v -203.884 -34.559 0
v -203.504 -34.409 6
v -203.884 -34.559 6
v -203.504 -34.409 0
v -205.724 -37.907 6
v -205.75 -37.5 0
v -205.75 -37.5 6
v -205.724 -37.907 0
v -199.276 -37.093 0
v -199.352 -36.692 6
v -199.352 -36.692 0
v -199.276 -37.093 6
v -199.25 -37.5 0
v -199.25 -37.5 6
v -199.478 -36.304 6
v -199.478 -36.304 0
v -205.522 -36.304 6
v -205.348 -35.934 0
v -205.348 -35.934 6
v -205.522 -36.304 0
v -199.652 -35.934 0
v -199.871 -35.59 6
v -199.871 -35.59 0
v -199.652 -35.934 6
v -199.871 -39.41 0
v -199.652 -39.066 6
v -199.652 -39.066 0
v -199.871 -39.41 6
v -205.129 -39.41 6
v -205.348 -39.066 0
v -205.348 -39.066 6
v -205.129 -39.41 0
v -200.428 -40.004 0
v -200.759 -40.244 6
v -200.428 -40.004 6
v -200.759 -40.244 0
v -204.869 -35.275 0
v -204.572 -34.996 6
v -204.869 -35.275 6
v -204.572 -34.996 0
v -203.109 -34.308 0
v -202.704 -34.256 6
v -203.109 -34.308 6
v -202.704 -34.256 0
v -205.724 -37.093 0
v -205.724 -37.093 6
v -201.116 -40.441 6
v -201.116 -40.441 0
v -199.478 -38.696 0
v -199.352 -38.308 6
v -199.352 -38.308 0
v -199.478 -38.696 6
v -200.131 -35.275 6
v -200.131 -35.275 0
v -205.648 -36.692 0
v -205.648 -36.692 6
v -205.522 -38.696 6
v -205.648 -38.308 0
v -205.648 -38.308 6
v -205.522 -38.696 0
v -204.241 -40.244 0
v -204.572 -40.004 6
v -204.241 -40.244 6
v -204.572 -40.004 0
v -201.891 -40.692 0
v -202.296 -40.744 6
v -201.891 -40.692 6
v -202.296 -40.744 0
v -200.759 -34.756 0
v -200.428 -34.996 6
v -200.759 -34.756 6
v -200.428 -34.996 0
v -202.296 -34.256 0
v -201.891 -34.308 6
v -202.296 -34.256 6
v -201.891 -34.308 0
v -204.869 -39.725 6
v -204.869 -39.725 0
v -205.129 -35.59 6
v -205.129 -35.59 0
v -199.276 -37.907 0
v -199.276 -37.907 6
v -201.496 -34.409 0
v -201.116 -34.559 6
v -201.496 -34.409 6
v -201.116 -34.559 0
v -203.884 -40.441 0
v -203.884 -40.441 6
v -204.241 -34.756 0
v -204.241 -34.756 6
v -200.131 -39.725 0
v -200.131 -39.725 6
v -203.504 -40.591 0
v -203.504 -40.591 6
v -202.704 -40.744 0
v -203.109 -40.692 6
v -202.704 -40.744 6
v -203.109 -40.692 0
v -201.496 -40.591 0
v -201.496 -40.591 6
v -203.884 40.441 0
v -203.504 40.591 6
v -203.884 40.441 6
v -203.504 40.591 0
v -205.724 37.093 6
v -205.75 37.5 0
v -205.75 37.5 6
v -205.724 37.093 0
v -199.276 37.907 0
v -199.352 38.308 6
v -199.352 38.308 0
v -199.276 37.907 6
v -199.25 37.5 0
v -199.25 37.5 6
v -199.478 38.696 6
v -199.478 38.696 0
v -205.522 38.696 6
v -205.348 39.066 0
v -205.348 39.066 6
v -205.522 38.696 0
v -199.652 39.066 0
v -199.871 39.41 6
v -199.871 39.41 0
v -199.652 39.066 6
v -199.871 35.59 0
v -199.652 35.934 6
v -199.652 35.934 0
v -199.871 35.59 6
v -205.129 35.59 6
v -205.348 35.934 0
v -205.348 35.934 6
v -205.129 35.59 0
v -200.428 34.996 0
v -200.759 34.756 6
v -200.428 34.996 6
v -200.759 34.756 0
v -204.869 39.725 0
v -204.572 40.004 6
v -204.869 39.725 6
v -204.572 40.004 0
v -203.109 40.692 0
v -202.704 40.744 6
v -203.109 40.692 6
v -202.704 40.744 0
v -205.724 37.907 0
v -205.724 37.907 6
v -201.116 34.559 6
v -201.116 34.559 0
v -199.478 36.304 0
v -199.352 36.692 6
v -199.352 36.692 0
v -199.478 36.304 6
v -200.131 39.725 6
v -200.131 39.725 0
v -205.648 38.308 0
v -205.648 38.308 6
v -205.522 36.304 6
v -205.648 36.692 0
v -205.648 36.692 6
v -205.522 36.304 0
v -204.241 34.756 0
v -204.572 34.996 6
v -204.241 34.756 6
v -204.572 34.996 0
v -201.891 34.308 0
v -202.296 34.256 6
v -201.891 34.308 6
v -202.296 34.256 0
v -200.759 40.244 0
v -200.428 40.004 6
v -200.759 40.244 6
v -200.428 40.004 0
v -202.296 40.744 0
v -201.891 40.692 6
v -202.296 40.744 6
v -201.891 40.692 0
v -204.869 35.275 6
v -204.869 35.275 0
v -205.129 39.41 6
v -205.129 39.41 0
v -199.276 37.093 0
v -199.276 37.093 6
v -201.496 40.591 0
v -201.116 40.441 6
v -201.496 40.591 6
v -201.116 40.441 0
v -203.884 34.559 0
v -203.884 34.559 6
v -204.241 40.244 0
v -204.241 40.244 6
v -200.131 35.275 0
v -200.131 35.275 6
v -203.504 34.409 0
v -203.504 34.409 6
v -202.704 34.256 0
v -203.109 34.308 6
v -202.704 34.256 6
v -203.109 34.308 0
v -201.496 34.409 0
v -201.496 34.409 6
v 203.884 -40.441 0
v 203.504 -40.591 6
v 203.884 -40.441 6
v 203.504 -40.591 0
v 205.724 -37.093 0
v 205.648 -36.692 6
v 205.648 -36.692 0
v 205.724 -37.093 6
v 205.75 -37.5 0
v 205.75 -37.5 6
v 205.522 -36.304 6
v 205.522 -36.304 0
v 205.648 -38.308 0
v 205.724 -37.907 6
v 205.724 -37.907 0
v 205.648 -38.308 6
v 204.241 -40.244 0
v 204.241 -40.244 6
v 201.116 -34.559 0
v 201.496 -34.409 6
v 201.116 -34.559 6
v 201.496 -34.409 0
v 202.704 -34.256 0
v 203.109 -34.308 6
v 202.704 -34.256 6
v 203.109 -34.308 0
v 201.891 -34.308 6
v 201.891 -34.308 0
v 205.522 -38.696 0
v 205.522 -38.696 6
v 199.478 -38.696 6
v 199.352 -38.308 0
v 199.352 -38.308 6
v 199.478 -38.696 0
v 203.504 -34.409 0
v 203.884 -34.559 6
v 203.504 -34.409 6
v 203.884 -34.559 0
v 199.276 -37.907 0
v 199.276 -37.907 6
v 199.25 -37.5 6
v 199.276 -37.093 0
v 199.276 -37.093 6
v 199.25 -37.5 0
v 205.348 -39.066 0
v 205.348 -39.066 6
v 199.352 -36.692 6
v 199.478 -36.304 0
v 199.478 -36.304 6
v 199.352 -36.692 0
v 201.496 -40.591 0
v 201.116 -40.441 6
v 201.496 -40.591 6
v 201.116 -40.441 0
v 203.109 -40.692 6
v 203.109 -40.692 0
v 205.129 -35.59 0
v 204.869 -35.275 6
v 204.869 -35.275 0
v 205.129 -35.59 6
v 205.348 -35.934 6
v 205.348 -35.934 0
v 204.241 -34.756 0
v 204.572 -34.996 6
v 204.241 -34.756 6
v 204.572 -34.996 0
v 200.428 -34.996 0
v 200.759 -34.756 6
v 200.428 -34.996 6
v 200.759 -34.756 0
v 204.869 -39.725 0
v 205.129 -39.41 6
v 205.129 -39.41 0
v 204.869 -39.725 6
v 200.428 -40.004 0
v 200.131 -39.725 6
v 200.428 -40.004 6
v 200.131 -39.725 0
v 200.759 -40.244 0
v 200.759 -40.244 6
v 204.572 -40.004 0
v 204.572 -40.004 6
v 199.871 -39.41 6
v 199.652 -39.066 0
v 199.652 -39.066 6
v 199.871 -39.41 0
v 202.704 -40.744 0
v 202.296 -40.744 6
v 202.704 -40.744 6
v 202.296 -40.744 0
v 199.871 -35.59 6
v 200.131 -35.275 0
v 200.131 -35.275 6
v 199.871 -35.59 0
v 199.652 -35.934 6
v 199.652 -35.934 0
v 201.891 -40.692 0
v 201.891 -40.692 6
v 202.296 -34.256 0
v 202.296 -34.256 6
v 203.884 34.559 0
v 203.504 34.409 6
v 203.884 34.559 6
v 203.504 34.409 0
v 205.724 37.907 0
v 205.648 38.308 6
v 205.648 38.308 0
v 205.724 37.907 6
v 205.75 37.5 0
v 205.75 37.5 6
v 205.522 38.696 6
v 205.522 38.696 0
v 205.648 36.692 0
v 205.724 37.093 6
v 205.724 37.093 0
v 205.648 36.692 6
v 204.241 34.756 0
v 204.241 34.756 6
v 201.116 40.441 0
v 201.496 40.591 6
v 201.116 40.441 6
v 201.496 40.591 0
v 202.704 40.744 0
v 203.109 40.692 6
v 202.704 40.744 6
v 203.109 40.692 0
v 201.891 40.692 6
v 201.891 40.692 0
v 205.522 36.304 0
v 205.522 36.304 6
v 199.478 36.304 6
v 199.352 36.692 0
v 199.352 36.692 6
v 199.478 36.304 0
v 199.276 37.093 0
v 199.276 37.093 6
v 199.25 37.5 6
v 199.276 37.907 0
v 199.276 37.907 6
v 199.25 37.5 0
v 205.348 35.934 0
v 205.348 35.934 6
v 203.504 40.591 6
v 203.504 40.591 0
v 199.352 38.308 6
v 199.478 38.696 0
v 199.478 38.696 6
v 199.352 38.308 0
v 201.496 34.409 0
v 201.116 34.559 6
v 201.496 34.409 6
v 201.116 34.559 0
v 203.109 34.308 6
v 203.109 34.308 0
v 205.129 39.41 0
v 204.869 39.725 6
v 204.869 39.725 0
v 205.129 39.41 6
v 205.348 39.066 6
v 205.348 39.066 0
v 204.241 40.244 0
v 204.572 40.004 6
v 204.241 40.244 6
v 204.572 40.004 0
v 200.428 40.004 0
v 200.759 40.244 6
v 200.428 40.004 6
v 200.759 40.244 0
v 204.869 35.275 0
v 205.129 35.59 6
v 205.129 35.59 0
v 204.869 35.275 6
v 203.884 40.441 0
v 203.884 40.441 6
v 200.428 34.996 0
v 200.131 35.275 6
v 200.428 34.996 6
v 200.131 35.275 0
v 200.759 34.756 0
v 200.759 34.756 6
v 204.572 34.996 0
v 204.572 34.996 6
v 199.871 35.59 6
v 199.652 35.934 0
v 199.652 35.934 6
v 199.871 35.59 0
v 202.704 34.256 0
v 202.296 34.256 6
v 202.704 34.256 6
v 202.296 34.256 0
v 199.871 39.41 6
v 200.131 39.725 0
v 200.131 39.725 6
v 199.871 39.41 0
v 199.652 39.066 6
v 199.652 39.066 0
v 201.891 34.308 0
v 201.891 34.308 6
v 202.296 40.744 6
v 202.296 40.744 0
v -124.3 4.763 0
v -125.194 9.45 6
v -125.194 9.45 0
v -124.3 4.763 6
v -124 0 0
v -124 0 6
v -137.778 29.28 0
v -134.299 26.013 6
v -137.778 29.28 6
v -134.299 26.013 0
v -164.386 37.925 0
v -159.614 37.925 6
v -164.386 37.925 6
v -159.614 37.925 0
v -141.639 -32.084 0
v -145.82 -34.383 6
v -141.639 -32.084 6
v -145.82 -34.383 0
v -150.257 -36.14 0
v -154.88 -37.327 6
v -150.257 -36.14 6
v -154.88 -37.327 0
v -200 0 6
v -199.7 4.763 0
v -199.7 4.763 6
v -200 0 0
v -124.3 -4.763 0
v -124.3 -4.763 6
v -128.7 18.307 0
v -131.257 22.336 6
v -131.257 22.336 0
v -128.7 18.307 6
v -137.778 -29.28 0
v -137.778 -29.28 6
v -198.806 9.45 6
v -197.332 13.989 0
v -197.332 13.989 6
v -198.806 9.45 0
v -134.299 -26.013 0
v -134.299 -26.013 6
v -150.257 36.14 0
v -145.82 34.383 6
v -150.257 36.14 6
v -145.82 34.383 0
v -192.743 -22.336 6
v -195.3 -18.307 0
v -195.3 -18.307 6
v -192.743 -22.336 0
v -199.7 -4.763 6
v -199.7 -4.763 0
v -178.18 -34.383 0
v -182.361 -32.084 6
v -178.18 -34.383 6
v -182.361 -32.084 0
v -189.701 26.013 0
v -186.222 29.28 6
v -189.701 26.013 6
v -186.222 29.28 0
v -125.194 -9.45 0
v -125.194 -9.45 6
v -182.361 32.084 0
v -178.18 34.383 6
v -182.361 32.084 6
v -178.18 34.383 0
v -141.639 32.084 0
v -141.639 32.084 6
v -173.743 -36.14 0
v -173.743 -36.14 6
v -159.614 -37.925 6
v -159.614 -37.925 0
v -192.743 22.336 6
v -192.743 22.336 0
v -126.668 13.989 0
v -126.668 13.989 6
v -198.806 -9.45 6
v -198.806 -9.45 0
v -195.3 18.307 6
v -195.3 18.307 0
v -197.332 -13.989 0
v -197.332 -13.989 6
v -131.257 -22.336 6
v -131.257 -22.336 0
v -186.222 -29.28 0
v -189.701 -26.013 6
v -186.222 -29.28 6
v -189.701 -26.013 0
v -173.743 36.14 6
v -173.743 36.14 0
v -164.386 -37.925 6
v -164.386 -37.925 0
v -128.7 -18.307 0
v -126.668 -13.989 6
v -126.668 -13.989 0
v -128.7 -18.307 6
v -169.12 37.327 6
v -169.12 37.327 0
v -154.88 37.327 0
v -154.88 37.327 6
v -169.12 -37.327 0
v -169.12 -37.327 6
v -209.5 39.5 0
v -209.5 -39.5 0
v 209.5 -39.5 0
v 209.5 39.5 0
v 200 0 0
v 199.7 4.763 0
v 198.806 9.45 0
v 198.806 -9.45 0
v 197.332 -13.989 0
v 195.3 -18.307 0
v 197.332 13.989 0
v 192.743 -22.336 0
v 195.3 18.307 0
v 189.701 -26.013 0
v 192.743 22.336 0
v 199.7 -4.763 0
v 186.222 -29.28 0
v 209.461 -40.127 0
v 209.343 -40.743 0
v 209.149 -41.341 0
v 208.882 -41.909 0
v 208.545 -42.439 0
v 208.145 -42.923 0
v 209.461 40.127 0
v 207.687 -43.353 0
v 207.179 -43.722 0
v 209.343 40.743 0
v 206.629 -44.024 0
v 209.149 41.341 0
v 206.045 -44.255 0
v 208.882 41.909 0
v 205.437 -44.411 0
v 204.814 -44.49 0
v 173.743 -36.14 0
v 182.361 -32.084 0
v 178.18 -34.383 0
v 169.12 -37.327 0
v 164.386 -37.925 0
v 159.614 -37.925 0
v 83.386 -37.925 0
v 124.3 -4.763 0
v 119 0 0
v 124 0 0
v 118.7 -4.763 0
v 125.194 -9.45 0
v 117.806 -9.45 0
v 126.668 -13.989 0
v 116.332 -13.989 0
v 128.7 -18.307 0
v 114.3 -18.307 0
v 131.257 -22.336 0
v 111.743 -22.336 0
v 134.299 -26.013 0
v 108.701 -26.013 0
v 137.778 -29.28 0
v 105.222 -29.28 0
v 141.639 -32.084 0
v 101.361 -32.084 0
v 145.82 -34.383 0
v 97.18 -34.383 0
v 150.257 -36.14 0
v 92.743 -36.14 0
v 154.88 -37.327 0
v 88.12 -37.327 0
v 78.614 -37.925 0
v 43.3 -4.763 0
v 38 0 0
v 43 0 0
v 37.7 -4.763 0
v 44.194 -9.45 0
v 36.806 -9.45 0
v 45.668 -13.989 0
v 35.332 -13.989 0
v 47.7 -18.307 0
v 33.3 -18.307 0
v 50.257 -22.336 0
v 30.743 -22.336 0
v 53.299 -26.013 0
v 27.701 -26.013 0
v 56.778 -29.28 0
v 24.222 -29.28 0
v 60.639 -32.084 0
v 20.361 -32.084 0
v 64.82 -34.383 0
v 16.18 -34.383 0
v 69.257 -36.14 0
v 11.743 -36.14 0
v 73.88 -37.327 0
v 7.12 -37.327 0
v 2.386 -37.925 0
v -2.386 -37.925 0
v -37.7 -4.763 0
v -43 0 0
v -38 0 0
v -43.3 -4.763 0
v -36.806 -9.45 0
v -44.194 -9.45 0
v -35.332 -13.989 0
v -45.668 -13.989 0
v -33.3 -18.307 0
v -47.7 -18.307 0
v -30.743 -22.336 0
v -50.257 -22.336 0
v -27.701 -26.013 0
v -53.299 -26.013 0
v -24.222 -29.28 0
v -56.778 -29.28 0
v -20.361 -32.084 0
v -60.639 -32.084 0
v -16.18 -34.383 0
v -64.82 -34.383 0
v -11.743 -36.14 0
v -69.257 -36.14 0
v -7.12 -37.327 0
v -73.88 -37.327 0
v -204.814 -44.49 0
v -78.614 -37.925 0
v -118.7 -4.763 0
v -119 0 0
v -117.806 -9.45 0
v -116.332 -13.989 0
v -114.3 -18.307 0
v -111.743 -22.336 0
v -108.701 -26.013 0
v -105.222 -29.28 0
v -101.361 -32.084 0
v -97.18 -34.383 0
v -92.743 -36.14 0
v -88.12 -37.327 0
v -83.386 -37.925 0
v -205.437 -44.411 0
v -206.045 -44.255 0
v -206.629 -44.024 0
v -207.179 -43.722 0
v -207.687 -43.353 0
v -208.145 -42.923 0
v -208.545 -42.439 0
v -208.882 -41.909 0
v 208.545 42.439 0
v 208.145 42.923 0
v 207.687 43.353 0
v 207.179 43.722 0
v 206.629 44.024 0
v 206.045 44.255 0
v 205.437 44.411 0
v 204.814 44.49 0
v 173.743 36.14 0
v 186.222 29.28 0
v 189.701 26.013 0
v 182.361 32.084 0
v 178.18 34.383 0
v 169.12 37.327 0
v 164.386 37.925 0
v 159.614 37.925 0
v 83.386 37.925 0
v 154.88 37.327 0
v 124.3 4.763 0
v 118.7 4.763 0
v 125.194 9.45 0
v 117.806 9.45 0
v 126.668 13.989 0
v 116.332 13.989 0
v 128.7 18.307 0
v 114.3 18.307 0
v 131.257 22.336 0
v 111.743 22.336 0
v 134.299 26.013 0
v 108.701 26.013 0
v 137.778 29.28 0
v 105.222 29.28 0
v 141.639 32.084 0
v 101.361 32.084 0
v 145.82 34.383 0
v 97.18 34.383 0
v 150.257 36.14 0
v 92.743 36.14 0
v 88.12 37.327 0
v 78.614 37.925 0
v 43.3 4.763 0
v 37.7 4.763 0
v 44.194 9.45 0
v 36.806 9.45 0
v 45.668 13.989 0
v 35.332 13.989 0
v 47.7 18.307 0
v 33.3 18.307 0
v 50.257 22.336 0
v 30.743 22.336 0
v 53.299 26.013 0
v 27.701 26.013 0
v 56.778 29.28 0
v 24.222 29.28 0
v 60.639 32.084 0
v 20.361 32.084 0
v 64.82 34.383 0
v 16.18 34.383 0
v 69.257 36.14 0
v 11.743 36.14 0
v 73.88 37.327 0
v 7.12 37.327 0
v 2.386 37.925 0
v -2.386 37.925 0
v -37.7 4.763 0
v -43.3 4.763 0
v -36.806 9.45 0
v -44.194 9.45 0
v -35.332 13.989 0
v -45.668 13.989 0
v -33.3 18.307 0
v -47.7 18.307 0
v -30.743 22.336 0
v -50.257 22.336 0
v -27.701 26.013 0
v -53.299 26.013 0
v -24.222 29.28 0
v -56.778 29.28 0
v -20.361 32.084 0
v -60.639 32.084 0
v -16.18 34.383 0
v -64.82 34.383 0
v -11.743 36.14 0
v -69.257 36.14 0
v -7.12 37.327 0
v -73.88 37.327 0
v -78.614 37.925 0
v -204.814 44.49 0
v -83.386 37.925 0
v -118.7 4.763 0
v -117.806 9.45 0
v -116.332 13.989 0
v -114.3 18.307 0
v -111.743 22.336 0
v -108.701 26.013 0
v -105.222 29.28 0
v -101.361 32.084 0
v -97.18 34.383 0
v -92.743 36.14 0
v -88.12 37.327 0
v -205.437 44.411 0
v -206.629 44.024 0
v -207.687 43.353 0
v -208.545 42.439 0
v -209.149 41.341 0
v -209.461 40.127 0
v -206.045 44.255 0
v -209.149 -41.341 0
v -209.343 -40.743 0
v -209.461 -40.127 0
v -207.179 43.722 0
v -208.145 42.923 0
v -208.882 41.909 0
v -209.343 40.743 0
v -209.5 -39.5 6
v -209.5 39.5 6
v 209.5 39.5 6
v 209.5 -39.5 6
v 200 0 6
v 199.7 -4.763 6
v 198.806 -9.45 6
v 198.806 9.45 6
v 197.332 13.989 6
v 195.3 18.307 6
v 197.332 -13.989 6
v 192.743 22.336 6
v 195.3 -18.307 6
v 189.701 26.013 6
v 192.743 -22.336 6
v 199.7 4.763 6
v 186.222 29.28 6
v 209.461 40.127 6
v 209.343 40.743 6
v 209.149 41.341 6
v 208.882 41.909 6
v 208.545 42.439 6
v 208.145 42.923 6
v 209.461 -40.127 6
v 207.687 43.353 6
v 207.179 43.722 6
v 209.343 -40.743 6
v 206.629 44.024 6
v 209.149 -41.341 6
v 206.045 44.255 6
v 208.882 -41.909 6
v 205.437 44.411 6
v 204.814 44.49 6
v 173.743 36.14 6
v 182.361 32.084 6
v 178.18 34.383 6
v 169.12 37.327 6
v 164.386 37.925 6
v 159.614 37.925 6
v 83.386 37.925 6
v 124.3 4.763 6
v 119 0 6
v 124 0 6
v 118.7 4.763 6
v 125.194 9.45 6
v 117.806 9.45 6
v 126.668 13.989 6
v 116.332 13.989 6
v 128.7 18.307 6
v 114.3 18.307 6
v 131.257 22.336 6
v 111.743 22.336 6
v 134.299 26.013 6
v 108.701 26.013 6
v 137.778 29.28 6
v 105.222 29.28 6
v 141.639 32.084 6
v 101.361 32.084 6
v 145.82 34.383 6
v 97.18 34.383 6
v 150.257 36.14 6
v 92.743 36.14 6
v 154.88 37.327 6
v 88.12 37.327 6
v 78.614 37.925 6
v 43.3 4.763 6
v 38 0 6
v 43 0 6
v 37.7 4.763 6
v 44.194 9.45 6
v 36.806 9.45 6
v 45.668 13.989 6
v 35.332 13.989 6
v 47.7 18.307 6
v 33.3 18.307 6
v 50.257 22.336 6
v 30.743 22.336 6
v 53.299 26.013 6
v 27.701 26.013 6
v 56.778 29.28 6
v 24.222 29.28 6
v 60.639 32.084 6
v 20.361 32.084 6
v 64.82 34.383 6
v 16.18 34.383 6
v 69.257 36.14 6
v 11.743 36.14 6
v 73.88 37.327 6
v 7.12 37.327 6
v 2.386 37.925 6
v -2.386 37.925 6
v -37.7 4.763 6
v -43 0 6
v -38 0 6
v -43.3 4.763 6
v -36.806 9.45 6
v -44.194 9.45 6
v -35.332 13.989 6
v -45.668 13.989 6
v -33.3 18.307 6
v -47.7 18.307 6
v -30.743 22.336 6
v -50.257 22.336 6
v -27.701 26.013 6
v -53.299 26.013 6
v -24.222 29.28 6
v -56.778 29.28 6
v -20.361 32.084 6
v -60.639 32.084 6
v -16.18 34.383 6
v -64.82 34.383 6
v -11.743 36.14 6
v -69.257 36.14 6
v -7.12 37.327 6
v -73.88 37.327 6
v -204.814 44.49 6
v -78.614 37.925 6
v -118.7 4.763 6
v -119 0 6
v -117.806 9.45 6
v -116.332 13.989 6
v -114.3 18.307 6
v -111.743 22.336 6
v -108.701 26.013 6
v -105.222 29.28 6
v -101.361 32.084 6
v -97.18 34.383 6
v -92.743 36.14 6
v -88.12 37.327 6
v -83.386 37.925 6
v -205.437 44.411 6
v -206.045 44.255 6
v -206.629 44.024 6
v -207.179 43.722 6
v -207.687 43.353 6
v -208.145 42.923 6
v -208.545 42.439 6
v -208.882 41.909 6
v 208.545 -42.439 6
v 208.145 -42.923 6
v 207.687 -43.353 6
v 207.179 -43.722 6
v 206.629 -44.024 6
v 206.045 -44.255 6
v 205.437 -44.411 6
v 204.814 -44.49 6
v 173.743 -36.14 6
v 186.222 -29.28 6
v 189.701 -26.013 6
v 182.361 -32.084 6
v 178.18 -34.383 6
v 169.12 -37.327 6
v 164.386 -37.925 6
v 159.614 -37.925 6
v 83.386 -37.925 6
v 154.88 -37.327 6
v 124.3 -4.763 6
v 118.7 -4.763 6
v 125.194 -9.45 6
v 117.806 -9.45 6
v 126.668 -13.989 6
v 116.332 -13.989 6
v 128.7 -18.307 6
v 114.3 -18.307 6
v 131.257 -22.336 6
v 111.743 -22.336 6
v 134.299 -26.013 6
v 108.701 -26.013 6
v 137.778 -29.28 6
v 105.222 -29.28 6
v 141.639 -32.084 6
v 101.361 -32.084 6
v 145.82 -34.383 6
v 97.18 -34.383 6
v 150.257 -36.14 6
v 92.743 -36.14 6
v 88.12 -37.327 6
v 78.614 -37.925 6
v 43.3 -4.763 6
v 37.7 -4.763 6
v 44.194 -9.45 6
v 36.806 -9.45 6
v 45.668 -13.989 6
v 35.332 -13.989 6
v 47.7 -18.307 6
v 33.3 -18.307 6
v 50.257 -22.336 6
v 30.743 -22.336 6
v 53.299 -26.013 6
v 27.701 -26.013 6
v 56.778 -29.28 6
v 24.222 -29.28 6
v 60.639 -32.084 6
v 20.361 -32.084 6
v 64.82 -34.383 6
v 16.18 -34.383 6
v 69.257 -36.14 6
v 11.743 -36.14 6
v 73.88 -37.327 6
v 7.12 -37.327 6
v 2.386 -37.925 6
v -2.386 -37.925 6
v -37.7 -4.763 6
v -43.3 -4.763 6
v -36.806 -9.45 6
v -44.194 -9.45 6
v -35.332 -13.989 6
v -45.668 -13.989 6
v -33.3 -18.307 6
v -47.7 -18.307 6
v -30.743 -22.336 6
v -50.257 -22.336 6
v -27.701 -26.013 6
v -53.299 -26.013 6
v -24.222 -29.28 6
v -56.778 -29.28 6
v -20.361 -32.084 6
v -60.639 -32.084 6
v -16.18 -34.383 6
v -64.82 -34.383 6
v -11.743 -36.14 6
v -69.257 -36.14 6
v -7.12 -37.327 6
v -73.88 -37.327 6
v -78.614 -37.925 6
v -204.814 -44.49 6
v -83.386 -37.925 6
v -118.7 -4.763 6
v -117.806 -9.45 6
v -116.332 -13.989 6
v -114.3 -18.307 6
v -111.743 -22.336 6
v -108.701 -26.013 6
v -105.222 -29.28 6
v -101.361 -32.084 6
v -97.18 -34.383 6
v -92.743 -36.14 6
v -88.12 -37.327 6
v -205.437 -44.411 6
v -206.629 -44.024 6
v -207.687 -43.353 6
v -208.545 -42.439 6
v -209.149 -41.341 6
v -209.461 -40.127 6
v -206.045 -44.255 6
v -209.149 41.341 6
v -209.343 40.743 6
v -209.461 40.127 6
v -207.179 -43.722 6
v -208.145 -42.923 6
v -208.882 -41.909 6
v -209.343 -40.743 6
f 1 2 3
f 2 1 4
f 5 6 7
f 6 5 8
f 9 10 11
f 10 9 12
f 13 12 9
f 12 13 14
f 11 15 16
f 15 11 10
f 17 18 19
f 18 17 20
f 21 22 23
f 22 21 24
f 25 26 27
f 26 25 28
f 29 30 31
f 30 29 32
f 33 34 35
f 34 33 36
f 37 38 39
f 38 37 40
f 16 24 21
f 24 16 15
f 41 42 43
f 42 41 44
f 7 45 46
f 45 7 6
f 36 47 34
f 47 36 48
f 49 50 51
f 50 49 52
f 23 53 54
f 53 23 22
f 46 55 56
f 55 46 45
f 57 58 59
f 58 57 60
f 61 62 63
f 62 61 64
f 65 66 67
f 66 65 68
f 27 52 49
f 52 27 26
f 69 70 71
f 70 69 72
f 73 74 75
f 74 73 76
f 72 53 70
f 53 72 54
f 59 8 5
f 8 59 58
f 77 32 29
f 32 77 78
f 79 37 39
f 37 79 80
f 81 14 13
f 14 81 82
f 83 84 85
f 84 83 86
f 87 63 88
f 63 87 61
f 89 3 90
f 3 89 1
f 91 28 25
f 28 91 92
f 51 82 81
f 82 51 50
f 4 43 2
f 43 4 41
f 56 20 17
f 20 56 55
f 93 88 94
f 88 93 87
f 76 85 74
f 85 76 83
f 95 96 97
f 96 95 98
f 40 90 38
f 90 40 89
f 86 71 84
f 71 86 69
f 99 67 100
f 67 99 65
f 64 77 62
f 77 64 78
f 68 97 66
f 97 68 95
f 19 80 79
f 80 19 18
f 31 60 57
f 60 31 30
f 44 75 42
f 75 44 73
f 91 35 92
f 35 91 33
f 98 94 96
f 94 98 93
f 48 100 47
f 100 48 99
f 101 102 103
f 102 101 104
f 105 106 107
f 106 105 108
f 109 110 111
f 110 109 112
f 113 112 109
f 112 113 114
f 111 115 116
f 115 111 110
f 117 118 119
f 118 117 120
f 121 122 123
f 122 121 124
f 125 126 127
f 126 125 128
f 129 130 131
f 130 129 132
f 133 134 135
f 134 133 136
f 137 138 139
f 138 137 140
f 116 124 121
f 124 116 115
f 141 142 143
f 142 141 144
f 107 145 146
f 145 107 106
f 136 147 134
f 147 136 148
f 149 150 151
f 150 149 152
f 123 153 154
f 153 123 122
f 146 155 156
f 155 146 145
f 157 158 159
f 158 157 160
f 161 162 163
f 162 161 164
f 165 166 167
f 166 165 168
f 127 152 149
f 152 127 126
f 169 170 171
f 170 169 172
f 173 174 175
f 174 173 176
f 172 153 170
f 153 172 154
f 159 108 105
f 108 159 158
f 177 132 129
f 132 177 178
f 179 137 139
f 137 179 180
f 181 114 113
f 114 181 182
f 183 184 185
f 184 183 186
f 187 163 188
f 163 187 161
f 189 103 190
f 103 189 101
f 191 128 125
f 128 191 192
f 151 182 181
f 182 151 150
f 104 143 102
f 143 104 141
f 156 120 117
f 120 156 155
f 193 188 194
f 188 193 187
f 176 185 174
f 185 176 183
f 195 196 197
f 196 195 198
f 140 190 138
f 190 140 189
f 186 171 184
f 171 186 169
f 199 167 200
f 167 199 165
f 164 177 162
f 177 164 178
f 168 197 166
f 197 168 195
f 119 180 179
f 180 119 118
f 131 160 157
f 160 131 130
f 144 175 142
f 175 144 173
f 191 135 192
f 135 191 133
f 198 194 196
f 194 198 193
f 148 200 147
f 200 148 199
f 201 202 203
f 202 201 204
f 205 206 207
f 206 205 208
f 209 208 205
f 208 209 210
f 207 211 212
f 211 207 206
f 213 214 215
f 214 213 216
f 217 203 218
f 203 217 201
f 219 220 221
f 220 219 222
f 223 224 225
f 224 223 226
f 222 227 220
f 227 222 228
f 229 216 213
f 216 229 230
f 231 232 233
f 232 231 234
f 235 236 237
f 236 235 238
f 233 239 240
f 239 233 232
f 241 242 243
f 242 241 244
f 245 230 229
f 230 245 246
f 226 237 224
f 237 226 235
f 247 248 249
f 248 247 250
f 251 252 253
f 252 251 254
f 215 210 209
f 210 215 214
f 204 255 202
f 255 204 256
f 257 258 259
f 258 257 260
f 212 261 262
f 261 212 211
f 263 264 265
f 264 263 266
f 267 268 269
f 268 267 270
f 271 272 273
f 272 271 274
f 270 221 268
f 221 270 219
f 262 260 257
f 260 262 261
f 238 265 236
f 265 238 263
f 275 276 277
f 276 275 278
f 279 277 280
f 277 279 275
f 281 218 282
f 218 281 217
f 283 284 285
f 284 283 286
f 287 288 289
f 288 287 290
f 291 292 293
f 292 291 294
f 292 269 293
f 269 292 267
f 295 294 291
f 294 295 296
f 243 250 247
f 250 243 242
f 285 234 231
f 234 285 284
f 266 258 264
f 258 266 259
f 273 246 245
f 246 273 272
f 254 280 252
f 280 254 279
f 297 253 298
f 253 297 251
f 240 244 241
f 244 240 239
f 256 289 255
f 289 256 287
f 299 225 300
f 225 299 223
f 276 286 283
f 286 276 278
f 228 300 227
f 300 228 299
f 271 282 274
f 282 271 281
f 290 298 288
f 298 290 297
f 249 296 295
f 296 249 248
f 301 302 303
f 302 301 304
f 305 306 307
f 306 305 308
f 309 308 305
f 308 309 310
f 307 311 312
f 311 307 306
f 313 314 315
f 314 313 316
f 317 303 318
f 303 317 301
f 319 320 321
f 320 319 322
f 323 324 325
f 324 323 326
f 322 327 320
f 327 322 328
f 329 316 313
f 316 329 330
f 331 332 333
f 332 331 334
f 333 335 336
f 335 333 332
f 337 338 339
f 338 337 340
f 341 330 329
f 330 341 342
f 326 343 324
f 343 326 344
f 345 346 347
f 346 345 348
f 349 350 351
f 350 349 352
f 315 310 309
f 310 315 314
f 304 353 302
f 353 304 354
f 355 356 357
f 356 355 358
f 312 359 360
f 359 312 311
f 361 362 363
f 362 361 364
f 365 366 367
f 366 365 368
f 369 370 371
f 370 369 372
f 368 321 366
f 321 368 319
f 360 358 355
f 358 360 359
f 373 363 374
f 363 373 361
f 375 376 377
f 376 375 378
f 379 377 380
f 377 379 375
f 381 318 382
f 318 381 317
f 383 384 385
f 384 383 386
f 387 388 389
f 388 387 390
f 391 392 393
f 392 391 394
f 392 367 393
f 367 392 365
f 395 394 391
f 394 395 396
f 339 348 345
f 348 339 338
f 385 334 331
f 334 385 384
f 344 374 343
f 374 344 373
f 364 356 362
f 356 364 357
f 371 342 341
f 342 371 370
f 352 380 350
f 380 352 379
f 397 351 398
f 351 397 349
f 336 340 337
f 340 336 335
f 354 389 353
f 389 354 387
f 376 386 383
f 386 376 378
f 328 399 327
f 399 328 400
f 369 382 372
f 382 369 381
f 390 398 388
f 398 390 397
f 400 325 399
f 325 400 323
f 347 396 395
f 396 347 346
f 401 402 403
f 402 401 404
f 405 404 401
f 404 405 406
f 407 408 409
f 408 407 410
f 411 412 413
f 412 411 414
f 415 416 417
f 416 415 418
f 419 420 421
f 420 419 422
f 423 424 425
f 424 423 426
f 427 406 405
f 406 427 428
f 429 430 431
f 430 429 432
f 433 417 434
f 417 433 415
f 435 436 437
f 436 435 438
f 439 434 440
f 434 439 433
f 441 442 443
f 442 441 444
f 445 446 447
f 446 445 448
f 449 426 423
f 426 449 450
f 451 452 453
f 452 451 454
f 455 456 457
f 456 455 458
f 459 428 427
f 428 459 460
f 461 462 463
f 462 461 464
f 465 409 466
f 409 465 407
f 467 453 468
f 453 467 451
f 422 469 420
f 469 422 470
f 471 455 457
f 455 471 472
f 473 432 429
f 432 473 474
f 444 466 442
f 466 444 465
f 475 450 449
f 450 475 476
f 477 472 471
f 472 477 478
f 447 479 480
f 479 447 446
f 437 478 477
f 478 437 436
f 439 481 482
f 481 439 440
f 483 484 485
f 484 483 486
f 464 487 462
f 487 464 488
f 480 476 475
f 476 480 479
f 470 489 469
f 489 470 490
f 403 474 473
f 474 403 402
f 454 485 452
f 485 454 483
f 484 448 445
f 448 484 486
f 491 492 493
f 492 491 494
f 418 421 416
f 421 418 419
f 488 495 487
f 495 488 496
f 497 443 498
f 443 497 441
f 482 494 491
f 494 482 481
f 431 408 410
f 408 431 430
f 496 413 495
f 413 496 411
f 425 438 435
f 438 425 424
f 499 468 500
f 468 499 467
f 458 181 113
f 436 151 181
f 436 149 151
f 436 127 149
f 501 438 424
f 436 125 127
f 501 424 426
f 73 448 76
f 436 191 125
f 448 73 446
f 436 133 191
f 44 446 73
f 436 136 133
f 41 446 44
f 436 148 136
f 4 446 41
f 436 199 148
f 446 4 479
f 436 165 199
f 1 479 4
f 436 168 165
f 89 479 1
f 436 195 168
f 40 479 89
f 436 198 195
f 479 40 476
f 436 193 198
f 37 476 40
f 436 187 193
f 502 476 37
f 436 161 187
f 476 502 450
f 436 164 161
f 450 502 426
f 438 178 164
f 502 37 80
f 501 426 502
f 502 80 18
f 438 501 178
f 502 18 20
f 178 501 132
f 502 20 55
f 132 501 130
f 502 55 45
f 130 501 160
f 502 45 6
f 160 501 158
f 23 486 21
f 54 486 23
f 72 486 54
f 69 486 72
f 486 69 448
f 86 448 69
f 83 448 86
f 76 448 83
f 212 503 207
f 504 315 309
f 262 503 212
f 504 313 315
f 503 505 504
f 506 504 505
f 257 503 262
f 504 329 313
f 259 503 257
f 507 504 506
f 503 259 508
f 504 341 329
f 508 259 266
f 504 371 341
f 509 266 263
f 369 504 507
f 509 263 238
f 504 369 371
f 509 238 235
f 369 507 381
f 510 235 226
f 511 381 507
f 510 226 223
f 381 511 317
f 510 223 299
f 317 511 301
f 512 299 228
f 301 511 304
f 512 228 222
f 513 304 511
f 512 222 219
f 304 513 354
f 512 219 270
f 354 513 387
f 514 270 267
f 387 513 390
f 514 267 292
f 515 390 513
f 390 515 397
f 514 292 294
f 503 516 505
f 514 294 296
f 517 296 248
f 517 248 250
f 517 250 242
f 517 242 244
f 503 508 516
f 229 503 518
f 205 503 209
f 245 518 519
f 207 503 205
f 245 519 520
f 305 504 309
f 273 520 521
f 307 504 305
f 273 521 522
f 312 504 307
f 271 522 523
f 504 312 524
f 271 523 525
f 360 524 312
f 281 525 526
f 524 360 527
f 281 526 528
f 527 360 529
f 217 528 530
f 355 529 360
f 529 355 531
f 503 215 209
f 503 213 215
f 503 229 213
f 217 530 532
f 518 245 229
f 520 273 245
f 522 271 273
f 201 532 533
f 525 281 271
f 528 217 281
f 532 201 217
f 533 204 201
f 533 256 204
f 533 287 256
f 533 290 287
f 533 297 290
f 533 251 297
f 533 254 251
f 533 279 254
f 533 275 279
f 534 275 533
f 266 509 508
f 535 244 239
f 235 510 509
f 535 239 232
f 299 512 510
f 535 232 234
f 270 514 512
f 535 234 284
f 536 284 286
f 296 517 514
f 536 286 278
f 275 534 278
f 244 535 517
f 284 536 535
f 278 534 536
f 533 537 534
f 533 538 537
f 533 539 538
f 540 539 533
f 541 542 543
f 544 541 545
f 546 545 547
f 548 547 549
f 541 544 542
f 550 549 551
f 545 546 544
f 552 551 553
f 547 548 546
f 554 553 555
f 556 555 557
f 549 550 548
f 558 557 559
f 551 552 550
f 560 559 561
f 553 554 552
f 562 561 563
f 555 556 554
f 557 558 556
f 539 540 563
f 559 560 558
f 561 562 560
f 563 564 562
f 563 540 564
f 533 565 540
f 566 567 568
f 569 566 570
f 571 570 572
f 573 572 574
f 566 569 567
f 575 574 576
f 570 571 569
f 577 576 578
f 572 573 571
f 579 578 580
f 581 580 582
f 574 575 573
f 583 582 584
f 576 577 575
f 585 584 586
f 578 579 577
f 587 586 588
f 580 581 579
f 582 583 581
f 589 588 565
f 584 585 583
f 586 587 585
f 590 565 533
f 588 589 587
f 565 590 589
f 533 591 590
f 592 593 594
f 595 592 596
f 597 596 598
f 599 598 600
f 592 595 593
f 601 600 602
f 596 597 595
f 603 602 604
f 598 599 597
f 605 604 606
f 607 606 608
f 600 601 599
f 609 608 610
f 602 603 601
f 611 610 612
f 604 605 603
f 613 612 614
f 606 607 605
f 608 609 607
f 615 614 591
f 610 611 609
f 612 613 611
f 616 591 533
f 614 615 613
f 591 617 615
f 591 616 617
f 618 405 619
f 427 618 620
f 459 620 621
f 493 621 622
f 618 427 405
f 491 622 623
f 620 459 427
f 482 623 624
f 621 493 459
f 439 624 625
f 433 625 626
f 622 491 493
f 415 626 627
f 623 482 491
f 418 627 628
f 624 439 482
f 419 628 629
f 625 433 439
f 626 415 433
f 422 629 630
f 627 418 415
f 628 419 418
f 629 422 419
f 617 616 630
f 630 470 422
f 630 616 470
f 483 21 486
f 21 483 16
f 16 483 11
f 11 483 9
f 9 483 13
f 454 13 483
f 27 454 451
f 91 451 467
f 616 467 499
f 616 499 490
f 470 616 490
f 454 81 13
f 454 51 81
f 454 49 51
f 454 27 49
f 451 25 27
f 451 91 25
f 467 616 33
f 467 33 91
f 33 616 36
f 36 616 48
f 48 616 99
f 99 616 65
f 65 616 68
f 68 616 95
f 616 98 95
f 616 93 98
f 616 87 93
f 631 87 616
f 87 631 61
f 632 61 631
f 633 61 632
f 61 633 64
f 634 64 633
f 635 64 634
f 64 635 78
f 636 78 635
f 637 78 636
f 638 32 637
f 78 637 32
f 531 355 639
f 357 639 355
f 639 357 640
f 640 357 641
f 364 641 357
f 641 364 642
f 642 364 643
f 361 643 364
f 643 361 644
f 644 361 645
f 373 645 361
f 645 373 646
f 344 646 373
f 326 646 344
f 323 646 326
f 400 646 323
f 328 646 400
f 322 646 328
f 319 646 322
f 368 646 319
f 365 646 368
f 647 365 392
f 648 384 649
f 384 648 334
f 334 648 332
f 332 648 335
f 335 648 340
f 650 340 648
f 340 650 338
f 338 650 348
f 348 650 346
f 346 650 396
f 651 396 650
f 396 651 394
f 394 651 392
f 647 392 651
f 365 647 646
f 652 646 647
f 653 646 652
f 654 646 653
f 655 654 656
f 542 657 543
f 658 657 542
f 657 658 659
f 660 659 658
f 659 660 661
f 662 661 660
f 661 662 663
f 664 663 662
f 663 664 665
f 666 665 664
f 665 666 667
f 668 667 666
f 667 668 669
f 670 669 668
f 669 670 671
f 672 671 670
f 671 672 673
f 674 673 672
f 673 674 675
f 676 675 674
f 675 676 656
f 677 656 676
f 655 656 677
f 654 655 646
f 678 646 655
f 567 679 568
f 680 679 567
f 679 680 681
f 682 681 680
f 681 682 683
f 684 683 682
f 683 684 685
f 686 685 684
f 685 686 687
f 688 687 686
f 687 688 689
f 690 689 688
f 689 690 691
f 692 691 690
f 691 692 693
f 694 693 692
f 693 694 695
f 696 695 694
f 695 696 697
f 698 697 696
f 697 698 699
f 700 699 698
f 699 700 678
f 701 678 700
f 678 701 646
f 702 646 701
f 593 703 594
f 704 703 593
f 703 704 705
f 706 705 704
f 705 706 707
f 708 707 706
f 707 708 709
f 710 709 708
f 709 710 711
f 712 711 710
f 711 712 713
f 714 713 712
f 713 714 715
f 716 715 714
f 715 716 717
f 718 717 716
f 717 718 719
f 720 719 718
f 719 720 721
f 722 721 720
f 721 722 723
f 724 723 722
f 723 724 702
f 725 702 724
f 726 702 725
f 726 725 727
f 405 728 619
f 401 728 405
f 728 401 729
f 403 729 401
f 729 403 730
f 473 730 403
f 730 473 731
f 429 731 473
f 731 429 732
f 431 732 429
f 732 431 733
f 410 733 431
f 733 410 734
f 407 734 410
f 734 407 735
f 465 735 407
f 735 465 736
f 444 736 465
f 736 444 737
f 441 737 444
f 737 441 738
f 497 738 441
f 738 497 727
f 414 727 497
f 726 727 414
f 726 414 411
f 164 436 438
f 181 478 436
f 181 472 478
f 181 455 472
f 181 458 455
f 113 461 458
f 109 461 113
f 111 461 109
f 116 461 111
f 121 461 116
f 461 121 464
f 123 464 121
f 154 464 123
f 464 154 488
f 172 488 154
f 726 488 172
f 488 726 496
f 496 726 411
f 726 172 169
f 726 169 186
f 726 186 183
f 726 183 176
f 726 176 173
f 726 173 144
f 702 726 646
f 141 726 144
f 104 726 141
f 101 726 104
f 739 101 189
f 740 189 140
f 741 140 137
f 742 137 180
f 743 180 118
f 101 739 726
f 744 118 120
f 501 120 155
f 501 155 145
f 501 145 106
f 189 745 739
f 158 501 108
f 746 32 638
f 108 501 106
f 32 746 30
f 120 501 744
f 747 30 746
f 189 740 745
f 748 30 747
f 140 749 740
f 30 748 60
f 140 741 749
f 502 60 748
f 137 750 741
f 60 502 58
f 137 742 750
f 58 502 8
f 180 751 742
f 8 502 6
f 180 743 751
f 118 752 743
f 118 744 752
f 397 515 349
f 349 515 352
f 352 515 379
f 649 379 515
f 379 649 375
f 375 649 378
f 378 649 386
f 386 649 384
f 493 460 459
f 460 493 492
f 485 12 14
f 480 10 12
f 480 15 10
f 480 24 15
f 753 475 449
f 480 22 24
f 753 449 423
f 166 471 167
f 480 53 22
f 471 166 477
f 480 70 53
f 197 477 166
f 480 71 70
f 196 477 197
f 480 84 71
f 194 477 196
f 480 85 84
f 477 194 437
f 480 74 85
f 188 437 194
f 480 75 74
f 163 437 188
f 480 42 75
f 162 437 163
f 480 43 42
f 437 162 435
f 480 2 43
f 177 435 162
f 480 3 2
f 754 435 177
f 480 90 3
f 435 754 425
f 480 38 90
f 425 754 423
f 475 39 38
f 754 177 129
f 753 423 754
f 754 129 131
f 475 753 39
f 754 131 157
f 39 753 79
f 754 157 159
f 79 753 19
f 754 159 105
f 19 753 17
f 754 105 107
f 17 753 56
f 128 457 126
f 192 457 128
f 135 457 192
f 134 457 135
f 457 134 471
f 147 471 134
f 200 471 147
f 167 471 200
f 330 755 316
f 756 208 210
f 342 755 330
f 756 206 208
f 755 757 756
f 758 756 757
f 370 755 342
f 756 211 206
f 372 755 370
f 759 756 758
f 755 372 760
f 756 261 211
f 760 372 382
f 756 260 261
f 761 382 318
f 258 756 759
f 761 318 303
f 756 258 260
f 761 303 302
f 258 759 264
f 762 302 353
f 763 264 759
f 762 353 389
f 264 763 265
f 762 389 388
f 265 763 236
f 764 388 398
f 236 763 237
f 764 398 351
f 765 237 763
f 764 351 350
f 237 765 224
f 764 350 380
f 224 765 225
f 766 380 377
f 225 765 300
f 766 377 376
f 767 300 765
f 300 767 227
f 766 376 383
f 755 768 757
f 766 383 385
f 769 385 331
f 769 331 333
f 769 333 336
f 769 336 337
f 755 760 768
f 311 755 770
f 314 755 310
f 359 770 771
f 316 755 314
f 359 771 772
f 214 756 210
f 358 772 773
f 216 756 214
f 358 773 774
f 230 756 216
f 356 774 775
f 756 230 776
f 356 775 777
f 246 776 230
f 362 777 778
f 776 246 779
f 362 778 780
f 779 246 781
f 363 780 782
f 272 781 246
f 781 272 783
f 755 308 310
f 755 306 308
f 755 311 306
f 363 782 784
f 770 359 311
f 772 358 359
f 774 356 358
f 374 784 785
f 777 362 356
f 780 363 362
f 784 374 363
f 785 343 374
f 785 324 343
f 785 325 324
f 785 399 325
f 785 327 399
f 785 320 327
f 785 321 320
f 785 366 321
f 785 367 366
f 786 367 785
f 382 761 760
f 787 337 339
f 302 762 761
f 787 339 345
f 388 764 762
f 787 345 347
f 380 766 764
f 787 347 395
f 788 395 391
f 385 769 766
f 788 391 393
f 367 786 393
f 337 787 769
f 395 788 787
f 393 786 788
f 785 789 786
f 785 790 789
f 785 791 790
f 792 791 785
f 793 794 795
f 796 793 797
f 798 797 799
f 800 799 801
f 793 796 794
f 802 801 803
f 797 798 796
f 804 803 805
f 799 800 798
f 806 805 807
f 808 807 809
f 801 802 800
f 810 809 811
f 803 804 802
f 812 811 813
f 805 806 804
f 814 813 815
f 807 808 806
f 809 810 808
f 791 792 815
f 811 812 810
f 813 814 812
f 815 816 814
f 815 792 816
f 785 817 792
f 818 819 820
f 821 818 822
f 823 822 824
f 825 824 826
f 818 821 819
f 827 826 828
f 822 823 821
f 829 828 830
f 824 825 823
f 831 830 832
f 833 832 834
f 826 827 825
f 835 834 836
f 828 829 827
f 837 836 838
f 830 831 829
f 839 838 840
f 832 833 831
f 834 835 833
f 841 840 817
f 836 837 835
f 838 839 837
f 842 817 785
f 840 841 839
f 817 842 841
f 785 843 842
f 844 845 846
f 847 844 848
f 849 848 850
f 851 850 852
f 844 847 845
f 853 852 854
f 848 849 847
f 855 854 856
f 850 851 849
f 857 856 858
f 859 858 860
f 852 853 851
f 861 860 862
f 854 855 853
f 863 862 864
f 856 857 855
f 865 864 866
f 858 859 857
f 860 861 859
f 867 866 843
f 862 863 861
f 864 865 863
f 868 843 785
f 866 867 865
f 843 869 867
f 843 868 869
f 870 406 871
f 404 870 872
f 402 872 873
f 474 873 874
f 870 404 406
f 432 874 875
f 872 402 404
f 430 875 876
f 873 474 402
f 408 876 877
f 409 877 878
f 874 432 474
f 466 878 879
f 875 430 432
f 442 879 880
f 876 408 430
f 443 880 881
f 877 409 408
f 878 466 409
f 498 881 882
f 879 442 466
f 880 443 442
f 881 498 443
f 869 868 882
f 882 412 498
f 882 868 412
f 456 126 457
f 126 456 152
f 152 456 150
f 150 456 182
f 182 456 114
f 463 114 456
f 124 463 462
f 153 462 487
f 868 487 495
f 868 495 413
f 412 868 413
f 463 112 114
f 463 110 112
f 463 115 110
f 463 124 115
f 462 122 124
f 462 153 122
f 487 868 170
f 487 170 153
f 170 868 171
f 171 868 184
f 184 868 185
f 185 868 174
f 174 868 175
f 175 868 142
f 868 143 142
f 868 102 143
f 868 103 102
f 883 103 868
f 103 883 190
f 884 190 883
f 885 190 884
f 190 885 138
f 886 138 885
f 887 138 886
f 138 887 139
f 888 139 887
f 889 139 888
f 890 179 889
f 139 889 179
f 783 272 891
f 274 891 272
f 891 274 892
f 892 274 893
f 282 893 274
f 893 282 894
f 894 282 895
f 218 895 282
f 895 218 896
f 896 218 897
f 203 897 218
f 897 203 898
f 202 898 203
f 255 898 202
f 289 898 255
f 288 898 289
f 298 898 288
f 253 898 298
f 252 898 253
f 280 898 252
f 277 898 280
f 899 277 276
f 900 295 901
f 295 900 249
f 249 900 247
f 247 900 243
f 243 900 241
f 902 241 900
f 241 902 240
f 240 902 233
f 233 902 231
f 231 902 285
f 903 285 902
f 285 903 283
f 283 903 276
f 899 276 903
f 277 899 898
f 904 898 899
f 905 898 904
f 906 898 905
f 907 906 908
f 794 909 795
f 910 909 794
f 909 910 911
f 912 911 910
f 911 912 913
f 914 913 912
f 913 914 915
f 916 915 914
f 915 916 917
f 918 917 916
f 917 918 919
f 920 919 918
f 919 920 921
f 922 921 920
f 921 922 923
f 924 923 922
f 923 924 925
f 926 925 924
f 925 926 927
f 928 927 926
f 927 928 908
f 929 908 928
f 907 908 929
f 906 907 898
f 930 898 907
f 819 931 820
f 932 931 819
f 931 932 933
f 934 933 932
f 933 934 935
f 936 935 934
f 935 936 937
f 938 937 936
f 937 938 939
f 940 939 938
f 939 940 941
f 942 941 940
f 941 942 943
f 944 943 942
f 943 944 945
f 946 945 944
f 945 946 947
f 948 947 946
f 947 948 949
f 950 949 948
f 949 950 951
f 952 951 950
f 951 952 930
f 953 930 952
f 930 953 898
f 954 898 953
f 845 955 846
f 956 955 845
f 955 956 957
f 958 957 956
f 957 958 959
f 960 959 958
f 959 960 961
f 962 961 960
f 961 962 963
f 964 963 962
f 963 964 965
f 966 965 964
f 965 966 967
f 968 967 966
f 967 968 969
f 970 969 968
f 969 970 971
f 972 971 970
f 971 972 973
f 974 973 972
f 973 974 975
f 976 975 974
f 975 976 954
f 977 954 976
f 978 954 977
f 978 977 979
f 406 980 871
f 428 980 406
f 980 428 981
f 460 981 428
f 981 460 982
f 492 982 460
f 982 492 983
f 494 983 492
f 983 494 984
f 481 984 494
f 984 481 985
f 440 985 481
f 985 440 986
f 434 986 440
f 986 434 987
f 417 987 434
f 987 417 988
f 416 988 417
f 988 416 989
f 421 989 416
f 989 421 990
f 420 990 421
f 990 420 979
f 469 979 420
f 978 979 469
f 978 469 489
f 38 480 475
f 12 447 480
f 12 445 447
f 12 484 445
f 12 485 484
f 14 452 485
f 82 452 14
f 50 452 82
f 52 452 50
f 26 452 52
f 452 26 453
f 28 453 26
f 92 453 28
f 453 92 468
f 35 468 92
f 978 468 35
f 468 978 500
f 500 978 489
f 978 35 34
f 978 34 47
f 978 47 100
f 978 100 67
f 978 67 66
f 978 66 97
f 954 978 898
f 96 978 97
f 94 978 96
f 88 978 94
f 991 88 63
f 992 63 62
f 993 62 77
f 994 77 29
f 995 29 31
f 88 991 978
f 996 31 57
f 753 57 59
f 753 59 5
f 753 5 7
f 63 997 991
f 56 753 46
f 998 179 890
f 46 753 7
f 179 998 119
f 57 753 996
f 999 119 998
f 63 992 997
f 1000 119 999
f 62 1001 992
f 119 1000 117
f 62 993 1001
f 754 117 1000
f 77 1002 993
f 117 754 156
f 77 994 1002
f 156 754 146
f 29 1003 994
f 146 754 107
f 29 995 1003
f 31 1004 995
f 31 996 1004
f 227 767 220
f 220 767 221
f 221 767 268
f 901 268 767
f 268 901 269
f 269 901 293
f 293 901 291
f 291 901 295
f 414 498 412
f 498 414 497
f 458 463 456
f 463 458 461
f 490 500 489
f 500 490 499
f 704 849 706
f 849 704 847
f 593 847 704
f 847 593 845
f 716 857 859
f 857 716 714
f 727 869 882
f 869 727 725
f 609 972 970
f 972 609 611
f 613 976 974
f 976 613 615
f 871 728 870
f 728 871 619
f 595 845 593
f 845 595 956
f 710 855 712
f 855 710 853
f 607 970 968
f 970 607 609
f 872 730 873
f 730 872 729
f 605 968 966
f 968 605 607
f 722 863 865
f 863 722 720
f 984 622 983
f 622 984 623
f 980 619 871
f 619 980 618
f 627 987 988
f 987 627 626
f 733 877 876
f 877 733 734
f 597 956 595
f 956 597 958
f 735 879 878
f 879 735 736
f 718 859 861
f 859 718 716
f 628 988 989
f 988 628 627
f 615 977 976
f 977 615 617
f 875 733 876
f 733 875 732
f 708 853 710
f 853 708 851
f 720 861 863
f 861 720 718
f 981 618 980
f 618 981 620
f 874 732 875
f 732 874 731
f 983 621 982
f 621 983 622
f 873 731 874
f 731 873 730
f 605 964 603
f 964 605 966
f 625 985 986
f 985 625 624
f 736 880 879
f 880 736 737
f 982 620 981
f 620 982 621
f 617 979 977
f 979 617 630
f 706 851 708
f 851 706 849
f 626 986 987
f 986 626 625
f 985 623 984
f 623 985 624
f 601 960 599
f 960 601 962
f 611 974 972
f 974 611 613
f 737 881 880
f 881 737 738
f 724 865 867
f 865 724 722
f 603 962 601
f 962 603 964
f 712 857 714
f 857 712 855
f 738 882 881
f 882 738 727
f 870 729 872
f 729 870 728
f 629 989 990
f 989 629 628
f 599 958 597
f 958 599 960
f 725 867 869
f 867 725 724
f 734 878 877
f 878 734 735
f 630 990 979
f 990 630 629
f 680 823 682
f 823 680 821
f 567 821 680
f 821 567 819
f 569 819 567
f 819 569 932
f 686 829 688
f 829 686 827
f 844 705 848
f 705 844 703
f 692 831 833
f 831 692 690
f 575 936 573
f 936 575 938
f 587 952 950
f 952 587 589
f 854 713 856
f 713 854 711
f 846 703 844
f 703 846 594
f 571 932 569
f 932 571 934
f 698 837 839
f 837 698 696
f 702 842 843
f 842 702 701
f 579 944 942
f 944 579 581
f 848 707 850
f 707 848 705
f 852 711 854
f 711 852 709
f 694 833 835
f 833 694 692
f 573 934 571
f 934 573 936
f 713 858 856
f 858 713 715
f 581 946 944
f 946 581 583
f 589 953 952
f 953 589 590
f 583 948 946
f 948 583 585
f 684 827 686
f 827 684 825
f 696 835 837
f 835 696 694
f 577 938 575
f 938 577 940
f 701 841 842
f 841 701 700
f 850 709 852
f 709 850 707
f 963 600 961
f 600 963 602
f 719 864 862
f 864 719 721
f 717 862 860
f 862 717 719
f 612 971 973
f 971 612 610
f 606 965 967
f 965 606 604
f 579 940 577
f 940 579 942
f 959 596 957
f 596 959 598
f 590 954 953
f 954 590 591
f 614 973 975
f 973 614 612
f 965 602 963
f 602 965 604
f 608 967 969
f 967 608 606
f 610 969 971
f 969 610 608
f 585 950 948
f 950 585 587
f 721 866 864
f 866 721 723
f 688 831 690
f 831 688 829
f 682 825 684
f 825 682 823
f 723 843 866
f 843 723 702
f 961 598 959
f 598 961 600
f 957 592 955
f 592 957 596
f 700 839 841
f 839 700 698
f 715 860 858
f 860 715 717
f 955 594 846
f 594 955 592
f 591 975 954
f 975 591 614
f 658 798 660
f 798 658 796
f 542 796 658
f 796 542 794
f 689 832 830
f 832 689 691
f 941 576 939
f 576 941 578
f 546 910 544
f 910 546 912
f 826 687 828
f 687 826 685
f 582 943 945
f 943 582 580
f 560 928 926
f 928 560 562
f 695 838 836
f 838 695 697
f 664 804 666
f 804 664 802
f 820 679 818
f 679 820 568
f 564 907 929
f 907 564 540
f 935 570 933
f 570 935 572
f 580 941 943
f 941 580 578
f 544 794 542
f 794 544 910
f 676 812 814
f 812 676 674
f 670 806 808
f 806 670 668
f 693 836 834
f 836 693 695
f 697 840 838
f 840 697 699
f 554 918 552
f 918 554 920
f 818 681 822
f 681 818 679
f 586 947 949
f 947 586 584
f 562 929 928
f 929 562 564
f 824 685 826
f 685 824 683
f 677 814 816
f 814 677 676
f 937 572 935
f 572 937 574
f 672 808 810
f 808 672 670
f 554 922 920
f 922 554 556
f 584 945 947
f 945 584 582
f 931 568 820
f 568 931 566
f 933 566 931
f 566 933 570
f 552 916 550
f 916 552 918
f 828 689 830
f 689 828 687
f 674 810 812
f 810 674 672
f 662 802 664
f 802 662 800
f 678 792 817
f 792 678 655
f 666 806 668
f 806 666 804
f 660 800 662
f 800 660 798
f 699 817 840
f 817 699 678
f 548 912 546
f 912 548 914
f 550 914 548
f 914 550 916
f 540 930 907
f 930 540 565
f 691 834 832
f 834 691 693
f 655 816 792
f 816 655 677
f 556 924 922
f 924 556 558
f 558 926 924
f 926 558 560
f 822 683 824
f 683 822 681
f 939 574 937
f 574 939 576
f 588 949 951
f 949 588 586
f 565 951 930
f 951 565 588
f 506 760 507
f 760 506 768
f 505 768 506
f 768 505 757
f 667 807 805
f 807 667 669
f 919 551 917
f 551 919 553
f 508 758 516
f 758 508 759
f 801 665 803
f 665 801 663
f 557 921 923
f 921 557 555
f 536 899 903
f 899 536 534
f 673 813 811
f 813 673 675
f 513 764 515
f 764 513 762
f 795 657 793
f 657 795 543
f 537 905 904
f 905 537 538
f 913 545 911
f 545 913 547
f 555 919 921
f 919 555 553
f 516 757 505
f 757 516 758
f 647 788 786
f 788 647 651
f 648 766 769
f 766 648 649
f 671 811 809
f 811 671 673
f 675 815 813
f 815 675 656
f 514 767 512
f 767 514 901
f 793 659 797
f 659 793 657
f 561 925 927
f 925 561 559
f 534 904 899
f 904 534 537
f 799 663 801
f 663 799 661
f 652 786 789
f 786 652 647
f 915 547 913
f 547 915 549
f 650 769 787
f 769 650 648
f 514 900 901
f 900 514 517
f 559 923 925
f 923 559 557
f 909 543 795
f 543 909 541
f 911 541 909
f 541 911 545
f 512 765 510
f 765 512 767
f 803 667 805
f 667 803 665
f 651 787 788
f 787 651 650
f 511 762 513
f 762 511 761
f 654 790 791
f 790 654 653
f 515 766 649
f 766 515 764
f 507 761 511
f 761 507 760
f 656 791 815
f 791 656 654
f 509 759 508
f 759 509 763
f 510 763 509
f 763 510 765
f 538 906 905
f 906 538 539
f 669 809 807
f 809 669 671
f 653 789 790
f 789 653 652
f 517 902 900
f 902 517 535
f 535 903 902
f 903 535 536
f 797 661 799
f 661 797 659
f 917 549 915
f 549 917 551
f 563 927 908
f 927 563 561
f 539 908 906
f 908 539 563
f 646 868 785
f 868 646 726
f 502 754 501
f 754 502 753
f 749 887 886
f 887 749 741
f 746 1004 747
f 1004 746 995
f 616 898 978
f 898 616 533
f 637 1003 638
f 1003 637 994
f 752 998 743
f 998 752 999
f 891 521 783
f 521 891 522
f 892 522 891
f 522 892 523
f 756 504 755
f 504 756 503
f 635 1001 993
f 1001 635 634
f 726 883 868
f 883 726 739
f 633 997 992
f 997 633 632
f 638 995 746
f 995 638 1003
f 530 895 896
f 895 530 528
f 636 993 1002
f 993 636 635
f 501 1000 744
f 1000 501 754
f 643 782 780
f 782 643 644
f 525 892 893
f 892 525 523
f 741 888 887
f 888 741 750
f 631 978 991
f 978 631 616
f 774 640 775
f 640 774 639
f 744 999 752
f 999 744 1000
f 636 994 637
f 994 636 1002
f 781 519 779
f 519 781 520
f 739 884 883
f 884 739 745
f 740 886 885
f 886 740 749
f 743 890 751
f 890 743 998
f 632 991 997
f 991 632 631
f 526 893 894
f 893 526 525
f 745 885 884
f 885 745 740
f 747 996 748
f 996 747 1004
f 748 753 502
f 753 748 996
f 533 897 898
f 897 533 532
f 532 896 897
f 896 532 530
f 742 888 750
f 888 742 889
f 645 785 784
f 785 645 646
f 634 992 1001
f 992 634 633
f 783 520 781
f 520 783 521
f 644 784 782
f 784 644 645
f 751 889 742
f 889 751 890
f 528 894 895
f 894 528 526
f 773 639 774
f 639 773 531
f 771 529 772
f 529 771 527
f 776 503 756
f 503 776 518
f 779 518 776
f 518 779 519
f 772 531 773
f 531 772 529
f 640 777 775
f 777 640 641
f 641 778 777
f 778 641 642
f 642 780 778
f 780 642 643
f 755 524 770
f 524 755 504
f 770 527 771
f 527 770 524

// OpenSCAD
$fn = 50;


difference() {
	union() {
		hull() {
			translate(v = [-204.5000000000, 39.5000000000, 0]) {
				cylinder(h = 6, r = 5);
			}
			translate(v = [204.5000000000, 39.5000000000, 0]) {
				cylinder(h = 6, r = 5);
			}
			translate(v = [-204.5000000000, -39.5000000000, 0]) {
				cylinder(h = 6, r = 5);
			}
			translate(v = [204.5000000000, -39.5000000000, 0]) {
				cylinder(h = 6, r = 5);
			}
		}
	}
	union() {
		#translate(v = [-202.5000000000, -37.5000000000, -100.0000000000]) {
			cylinder(h = 200, r = 3.2500000000);
		}
		#translate(v = [-202.5000000000, 37.5000000000, -100.0000000000]) {
			cylinder(h = 200, r = 3.2500000000);
		}
		#translate(v = [202.5000000000, -37.5000000000, -100.0000000000]) {
			cylinder(h = 200, r = 3.2500000000);
		}
		#translate(v = [202.5000000000, 37.5000000000, -100.0000000000]) {
			cylinder(h = 200, r = 3.2500000000);
		}
		#translate(v = [-162.0000000000, 0, 0]) {
			cylinder(h = 6, r = 38.0000000000);
		}
		#translate(v = [-81.0000000000, 0, 0]) {
			cylinder(h = 6, r = 38.0000000000);
		}
		#cylinder(h = 6, r = 38.0000000000);
		#translate(v = [81.0000000000, 0, 0]) {
			cylinder(h = 6, r = 38.0000000000);
		}
		#translate(v = [162.0000000000, 0, 0]) {
			cylinder(h = 6, r = 38.0000000000);
		}
	}
}
